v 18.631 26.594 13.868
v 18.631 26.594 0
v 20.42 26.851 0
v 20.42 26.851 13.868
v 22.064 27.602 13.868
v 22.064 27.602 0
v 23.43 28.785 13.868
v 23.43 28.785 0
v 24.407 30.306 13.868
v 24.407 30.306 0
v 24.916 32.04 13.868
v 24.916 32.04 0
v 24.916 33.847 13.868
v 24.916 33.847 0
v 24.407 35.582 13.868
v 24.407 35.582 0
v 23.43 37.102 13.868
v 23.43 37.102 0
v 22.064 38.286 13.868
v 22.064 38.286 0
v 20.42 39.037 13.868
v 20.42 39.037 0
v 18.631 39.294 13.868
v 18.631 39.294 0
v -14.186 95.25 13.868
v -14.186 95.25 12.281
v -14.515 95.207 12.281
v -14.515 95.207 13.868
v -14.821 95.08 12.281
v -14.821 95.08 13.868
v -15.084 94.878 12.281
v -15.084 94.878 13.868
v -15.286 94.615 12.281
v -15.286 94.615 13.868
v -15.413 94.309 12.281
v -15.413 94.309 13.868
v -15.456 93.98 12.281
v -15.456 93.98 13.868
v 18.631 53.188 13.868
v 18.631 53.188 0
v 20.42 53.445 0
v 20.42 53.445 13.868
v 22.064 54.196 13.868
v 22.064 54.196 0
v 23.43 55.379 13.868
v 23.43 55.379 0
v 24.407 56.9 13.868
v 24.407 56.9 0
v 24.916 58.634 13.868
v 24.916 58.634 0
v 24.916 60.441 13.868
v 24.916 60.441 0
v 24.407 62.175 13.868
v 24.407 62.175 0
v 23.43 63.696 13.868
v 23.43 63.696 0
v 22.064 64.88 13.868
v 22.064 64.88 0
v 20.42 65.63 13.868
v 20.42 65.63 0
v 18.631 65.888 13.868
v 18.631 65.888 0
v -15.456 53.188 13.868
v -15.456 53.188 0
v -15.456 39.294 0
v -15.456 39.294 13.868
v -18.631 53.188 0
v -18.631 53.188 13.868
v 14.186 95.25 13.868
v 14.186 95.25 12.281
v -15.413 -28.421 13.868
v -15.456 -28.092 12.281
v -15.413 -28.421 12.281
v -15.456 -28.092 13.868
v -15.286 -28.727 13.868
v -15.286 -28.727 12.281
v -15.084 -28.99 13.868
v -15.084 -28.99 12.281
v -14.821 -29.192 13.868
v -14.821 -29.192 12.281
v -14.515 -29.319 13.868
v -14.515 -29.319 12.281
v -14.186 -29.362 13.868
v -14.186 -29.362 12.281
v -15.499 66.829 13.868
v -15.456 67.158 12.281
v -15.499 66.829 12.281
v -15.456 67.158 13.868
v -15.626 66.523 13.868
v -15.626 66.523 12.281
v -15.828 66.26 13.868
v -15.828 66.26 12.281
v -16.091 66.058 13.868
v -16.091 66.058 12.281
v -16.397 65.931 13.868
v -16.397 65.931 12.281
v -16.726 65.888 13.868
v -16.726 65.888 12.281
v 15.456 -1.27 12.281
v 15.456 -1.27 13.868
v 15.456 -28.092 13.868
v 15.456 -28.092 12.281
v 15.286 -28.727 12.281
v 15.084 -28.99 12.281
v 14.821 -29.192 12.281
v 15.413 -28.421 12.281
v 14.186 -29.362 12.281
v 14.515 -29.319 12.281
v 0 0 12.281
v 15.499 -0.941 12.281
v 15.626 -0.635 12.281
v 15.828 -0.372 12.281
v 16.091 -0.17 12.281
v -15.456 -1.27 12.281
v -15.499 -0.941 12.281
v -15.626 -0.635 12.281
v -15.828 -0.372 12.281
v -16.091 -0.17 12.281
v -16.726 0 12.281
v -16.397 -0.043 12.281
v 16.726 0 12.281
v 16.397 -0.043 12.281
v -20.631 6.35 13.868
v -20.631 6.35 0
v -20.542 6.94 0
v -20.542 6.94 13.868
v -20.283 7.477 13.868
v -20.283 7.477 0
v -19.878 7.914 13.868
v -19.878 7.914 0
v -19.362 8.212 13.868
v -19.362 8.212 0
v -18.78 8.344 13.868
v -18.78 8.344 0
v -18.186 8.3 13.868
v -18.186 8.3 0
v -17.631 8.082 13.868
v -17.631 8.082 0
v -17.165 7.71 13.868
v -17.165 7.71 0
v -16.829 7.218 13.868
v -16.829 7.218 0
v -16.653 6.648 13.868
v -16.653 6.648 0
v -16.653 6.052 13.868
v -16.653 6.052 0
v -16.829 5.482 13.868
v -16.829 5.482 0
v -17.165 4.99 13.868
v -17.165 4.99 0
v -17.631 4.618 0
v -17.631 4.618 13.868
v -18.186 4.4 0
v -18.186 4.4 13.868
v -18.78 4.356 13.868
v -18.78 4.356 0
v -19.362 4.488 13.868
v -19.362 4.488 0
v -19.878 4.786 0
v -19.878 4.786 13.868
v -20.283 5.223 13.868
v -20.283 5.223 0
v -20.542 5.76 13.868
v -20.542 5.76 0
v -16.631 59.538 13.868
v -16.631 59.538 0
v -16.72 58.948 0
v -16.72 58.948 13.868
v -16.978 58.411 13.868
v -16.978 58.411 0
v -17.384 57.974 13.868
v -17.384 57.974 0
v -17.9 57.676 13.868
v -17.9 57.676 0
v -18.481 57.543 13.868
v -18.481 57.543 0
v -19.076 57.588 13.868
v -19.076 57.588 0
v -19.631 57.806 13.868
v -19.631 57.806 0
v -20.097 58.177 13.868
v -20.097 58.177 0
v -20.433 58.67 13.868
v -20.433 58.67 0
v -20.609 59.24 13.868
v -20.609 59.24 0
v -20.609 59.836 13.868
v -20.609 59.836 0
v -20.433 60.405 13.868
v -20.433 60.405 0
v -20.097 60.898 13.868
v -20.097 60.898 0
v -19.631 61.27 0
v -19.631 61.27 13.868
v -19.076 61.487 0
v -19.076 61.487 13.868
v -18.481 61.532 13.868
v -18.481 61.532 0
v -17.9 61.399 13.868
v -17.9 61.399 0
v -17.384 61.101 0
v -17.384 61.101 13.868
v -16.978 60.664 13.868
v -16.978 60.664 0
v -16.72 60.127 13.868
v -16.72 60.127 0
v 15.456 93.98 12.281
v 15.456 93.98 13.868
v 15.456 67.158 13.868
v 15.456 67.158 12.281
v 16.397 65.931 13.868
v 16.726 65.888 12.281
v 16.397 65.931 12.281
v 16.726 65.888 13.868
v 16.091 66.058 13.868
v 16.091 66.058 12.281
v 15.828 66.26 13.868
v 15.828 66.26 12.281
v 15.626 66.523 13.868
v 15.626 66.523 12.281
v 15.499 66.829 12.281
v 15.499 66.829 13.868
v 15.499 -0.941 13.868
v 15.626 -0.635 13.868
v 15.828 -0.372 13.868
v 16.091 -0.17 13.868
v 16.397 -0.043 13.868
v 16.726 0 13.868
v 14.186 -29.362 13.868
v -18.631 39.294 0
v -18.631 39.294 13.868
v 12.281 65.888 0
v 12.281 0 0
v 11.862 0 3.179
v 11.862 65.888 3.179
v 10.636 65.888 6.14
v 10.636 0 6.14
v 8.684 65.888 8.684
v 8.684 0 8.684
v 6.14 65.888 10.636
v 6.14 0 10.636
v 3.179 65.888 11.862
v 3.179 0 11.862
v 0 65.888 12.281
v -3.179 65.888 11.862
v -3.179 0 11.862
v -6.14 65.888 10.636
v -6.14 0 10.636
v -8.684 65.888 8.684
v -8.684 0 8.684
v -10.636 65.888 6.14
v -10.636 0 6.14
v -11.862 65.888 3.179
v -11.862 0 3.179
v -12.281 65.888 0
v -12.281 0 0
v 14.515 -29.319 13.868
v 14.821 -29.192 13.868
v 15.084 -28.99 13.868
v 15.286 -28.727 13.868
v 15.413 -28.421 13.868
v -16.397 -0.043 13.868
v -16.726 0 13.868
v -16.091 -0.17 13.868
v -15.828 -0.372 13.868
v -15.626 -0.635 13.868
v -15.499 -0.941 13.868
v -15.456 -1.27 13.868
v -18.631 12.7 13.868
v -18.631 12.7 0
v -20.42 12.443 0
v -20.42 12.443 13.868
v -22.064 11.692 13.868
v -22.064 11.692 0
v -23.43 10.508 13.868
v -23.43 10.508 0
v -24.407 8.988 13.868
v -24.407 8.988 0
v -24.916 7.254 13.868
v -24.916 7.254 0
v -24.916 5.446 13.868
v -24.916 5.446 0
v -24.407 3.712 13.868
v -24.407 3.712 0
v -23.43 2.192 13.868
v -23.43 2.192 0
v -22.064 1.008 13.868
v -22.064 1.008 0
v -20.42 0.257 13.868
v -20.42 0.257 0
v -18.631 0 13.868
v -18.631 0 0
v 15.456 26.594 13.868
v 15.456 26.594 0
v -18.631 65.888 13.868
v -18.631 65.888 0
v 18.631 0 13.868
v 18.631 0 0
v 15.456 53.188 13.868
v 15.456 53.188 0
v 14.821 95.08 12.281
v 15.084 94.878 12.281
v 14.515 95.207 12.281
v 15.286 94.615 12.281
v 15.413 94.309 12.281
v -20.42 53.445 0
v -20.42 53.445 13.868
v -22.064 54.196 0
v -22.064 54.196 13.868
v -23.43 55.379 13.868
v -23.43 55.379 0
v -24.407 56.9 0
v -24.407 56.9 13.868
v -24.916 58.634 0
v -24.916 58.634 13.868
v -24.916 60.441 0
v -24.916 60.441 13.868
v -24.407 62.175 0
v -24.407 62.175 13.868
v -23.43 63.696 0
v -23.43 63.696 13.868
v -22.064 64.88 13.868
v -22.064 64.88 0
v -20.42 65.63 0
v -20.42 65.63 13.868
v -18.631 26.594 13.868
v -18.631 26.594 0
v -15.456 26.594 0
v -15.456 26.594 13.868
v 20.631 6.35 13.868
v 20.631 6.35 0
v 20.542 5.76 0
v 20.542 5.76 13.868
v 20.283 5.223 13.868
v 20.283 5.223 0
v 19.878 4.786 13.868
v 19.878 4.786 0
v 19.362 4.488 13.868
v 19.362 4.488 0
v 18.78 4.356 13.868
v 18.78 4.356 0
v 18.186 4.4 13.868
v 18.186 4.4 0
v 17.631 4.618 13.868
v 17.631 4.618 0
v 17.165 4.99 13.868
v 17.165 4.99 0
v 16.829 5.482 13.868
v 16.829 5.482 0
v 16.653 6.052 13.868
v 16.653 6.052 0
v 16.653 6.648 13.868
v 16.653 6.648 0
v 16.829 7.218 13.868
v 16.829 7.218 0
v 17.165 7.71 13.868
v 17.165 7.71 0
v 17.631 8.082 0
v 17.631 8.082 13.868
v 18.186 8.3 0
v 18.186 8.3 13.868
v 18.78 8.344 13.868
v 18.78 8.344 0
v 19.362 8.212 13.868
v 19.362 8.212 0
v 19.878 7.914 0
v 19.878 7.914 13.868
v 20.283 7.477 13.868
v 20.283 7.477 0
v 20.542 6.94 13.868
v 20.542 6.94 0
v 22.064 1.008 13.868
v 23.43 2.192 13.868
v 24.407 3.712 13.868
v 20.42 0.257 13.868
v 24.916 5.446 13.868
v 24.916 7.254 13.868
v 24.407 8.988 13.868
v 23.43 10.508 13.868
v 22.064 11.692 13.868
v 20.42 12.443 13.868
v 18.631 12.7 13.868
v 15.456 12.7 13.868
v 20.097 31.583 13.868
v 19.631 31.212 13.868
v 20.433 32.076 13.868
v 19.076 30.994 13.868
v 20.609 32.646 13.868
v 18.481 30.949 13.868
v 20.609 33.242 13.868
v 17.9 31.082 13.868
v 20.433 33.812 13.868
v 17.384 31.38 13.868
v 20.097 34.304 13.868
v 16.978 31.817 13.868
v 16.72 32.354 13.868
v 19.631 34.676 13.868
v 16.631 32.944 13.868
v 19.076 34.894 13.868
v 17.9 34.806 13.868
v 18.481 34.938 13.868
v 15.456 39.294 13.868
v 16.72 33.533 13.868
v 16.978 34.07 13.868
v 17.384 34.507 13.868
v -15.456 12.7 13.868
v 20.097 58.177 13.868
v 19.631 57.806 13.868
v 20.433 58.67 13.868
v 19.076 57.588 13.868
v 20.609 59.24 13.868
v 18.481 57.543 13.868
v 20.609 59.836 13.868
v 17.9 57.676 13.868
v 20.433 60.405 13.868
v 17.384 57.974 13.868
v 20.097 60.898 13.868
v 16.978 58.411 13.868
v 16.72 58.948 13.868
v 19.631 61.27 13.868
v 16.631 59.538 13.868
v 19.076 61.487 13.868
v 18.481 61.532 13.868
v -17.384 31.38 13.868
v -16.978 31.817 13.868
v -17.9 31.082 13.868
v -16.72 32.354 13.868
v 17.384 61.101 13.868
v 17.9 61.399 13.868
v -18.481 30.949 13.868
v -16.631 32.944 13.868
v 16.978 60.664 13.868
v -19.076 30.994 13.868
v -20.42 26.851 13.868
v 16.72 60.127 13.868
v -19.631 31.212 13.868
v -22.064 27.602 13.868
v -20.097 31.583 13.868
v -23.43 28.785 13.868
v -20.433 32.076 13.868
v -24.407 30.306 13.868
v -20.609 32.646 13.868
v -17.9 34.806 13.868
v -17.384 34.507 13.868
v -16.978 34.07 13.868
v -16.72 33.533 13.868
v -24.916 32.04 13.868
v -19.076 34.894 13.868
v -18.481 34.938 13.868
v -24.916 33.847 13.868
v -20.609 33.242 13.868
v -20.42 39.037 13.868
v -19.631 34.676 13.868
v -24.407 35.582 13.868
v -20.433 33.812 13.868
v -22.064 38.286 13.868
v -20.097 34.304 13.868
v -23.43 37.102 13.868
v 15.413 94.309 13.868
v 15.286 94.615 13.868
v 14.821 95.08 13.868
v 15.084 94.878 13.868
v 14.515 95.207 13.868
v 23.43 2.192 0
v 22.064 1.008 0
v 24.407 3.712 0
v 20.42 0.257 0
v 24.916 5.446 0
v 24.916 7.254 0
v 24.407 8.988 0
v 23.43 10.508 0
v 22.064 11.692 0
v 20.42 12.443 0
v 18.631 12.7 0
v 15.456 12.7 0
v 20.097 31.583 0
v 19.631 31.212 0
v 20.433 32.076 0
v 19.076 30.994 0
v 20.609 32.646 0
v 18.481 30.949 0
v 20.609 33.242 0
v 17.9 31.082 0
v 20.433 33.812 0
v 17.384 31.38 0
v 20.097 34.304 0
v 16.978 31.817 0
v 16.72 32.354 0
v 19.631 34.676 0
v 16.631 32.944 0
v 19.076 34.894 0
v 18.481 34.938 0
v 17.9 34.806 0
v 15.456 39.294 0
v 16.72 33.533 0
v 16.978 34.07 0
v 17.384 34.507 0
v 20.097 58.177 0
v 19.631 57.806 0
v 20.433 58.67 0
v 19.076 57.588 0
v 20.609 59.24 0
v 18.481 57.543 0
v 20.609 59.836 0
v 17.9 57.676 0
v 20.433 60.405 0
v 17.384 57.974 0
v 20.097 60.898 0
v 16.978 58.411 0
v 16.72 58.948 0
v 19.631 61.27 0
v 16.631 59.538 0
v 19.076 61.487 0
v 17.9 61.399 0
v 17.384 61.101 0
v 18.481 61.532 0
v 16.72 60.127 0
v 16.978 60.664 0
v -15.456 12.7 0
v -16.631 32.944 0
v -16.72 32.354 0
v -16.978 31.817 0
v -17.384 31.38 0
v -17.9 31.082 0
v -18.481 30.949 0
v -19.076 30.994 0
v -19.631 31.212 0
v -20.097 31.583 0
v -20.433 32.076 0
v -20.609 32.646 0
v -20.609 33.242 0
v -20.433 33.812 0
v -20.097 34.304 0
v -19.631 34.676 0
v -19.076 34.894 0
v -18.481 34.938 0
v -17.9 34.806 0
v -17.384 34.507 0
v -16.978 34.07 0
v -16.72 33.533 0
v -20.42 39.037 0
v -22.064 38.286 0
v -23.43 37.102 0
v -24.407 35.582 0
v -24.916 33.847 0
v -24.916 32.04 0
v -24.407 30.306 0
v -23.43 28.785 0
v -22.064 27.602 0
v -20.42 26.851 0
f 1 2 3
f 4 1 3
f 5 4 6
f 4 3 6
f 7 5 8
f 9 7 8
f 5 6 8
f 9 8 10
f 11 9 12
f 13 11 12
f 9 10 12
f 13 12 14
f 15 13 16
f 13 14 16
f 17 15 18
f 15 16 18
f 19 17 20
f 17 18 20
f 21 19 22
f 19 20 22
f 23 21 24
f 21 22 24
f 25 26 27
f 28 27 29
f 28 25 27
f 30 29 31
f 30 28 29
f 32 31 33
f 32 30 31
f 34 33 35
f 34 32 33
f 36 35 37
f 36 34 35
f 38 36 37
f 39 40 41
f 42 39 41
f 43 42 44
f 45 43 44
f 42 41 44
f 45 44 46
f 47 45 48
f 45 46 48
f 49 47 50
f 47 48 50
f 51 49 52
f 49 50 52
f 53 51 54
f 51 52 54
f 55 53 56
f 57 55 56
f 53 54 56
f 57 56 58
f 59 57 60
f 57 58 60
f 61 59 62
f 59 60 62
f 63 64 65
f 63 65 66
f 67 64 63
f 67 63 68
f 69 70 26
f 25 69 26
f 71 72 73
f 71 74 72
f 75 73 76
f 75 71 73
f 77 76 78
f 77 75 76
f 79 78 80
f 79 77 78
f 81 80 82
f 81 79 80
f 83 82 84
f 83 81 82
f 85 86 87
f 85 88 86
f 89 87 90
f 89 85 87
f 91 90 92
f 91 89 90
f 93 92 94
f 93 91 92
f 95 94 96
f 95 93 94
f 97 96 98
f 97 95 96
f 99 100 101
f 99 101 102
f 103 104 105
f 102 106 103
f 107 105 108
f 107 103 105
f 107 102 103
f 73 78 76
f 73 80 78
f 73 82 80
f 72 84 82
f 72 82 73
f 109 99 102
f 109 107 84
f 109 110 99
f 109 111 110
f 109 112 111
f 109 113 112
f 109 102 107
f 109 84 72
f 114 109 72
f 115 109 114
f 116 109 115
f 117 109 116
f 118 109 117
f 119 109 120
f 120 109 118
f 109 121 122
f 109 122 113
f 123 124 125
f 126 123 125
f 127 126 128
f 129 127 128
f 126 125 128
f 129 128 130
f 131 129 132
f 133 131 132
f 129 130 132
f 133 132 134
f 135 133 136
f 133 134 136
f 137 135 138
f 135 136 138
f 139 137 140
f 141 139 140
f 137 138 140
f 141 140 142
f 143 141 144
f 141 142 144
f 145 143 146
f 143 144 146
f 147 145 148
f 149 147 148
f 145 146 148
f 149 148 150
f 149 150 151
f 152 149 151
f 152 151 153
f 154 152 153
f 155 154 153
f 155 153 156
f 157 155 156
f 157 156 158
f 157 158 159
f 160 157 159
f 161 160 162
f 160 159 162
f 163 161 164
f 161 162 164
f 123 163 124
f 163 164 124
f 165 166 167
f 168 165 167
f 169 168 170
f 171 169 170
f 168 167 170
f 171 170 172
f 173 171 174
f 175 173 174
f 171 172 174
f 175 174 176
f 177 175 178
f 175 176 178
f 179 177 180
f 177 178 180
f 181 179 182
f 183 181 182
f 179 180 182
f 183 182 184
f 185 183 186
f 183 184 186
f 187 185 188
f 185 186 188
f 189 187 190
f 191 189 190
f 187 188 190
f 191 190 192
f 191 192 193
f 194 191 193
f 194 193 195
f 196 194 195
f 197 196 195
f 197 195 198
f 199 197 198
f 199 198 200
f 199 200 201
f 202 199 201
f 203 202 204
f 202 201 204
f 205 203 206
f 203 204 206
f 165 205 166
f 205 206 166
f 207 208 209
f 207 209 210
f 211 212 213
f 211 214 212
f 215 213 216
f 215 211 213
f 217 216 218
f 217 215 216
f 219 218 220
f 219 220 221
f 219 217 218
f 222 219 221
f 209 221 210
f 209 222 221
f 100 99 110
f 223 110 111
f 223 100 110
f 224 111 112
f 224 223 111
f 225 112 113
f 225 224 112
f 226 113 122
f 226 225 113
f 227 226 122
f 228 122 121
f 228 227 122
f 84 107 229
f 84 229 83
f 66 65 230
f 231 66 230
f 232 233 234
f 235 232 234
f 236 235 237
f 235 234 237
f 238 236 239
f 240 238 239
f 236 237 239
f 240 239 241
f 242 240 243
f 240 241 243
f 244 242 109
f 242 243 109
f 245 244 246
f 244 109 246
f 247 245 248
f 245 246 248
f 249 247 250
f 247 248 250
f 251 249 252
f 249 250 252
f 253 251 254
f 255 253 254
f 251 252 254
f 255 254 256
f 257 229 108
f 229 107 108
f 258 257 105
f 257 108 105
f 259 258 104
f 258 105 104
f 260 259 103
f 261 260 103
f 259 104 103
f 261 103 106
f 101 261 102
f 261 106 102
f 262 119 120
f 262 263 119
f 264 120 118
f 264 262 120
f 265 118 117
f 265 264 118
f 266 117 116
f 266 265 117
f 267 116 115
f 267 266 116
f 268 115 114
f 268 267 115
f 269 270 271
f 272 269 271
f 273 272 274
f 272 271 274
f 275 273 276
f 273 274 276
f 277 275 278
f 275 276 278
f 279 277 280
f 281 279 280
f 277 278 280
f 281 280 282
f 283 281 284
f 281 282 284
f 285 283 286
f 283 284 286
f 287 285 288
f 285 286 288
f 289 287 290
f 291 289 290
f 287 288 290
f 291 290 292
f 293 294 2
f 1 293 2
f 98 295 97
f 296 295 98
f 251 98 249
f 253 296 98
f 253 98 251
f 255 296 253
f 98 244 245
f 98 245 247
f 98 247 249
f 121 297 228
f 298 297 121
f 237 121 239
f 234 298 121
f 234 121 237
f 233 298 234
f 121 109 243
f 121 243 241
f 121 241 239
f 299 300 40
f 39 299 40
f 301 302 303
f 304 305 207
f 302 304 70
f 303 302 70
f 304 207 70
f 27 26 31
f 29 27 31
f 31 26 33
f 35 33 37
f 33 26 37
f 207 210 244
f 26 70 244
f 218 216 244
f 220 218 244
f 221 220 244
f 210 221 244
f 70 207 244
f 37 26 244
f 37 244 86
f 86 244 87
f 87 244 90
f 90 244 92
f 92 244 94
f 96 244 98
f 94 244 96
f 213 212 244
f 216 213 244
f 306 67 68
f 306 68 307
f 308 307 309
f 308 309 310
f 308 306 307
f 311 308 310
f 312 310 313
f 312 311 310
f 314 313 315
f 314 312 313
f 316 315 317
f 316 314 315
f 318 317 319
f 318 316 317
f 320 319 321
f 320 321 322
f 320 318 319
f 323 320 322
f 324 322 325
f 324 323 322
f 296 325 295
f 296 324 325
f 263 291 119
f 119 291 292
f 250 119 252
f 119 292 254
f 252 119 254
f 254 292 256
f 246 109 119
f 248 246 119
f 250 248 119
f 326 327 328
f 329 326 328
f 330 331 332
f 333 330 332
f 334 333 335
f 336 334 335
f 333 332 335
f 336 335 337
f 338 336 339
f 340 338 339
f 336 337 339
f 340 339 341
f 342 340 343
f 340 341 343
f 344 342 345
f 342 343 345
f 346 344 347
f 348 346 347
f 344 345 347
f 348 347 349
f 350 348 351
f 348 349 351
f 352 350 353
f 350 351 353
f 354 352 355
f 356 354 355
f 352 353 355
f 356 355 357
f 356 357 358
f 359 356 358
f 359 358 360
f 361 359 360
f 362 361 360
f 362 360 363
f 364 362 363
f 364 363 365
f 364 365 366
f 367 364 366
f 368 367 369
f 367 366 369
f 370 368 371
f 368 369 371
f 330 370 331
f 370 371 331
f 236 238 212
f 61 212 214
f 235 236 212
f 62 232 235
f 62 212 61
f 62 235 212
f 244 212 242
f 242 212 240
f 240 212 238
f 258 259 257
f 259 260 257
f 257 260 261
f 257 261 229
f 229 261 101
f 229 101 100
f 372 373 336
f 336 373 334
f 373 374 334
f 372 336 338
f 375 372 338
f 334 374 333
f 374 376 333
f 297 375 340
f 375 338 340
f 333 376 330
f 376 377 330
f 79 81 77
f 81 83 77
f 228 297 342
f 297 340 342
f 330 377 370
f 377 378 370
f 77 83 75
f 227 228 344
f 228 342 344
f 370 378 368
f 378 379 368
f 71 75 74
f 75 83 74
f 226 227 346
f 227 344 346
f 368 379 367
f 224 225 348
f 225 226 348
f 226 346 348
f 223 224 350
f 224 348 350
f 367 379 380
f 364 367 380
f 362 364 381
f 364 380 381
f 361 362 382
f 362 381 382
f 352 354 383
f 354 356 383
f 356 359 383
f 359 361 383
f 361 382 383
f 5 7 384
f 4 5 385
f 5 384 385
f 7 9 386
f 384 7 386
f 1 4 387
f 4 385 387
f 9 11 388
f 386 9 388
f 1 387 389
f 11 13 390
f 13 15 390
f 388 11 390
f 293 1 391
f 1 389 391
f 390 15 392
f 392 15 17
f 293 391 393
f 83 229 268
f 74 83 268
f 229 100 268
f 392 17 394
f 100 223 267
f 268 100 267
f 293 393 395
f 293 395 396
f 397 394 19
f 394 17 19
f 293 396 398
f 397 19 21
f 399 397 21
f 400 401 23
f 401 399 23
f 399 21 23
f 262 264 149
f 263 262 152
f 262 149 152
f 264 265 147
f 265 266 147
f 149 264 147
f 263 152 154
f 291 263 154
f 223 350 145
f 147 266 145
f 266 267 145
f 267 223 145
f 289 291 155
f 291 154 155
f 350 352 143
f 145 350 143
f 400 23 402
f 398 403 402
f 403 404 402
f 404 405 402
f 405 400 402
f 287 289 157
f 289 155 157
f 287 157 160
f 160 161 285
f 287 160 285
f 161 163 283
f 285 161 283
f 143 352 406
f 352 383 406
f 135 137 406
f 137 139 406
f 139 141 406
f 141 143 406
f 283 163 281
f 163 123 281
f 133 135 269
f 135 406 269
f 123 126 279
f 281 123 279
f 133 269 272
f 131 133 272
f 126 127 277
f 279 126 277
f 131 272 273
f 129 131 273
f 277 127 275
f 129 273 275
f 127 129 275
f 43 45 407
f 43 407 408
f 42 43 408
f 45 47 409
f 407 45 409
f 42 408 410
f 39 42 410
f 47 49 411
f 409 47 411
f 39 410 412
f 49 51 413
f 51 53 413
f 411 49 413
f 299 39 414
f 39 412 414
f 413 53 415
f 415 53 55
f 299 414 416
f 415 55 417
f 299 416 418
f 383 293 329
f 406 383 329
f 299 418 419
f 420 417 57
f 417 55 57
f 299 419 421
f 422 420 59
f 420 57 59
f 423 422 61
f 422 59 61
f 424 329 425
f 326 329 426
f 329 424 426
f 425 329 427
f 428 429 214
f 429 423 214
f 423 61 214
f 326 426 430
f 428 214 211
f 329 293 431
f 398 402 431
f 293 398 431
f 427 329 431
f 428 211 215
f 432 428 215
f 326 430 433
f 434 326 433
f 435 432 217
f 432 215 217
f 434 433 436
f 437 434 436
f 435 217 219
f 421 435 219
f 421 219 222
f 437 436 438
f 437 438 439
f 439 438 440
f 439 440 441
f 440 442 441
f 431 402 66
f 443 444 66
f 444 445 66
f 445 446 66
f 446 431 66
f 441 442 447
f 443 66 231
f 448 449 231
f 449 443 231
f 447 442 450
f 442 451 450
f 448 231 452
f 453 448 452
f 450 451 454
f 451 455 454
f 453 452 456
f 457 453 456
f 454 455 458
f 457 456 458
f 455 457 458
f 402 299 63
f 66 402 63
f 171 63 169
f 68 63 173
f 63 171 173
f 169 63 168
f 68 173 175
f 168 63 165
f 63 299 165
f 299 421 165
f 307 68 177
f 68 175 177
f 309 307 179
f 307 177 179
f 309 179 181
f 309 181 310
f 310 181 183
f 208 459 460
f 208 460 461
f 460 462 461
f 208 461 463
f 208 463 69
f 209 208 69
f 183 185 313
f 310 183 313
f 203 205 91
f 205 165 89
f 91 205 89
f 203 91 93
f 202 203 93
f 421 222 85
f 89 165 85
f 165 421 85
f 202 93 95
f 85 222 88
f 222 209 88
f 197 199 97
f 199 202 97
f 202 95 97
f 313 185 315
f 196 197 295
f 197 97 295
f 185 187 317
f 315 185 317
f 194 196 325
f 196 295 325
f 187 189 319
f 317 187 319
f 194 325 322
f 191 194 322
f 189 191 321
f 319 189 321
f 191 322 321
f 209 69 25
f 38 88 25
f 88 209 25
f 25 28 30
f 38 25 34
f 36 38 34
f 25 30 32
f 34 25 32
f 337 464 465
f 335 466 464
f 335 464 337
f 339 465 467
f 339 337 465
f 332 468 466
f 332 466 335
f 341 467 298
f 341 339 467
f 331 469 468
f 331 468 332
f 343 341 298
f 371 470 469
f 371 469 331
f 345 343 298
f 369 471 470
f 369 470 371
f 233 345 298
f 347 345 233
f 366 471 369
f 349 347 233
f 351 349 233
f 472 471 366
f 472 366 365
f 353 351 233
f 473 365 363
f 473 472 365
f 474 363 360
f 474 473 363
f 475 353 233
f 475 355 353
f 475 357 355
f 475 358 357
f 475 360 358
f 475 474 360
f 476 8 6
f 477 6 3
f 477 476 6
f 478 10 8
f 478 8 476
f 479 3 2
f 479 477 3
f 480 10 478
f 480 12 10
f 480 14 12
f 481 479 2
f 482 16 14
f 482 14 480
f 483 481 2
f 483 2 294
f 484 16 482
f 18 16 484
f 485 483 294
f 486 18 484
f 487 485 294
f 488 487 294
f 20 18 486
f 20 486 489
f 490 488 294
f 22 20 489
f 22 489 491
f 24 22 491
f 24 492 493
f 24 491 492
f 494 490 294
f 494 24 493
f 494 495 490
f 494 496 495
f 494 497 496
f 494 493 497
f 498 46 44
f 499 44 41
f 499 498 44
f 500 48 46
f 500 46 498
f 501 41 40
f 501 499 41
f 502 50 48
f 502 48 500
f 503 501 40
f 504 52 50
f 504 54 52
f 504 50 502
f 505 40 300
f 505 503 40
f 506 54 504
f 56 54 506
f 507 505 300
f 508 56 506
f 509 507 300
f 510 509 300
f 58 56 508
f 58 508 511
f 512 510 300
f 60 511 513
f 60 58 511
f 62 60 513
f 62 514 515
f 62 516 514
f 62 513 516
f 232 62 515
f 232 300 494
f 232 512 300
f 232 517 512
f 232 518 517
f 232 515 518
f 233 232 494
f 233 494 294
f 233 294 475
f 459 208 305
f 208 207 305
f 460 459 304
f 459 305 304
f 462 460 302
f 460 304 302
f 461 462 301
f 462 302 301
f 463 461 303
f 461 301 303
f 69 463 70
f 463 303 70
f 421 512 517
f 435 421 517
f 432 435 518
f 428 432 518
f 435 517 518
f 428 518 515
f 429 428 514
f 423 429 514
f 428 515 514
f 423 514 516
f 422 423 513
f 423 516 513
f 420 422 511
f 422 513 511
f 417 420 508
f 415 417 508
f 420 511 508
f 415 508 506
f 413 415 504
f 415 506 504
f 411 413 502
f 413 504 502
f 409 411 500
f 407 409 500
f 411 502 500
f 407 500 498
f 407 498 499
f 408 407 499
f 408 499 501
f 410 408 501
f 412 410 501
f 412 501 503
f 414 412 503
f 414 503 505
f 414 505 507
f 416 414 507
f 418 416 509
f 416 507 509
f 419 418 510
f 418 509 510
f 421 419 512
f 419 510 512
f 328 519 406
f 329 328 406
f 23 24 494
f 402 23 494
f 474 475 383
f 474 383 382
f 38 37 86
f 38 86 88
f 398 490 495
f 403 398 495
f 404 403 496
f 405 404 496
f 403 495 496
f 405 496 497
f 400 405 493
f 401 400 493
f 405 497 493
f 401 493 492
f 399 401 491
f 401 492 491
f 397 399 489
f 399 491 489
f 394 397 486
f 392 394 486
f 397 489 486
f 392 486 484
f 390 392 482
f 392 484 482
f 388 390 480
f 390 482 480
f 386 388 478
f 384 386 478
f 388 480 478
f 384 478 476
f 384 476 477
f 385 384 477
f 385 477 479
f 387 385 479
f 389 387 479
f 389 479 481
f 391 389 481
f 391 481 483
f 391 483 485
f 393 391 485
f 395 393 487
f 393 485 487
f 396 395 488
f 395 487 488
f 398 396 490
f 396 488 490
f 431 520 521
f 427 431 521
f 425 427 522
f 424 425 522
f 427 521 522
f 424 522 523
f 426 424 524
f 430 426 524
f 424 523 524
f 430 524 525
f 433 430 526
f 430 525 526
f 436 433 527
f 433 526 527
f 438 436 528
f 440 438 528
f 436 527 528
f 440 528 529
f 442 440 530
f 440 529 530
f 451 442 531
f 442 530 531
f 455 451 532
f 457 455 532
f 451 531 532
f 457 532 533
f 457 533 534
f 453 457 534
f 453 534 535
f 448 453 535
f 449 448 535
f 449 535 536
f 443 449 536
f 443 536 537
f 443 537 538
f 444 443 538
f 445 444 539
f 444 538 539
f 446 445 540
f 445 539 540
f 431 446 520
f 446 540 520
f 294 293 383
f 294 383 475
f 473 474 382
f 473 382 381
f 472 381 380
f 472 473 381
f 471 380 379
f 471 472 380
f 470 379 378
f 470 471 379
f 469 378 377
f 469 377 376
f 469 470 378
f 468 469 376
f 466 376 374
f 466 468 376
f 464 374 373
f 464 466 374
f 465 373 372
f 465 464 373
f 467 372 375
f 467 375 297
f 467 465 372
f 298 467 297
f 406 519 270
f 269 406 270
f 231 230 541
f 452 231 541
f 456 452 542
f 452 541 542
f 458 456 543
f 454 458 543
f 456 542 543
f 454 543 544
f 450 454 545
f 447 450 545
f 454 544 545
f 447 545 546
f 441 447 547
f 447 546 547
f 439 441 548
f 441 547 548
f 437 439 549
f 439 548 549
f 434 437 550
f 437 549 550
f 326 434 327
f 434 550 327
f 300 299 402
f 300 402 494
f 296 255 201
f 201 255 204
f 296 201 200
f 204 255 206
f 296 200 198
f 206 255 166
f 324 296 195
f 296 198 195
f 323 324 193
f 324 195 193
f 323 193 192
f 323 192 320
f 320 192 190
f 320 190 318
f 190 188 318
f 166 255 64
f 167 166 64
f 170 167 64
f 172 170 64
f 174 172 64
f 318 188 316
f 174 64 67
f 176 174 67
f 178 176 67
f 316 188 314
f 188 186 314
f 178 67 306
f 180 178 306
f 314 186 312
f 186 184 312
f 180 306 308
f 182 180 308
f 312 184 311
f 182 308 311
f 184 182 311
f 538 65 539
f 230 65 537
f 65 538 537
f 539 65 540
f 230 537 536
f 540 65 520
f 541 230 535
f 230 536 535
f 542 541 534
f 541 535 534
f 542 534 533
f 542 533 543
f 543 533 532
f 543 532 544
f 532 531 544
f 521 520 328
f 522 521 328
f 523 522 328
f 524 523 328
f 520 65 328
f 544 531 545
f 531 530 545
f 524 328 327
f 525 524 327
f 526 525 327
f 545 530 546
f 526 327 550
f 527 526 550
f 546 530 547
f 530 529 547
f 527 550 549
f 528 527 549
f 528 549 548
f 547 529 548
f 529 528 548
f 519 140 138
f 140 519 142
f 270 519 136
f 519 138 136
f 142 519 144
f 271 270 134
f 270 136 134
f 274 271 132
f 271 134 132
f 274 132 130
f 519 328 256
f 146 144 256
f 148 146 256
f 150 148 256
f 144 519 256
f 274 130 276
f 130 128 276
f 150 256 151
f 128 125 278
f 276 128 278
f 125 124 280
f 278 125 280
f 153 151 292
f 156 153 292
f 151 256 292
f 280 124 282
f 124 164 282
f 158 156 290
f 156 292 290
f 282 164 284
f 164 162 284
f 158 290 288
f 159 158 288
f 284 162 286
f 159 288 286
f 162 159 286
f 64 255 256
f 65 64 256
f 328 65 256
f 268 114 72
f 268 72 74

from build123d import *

# Parameters (mm, degrees)
BOSS_EXTRUDE1_DEPTH = 65.8876
BOSS_EXTRUDE2_DEPTH = 29.3624
SKETCH4_R           = 2
BOSS_EXTRUDE3_DEPTH = 13.8684
FILLET1_R           = 1.27


with BuildPart() as part:
    # Sketch1 → Boss-Extrude1 (new body)
    with BuildSketch(Plane(origin=(0, 0, 0), x_dir=(1, 0, 0), z_dir=(0, 1, 0))):
        with BuildLine():
            Line((-12.2809, 0), (-15.4559, 0))
            Line((-15.4559, 0), (-15.4559, -13.3604))
            Line((-15.4559, -13.3604), (-15.4559, -13.8684))
            Line((-15.4559, -13.8684), (0, -13.8684))
            Line((0, -13.8684), (15.4559, -13.8684))
            Line((15.4559, -13.8684), (15.4559, -13.3604))
            Line((15.4559, -13.3604), (15.4559, 0))
            Line((15.4559, 0), (12.2809, 0))
            ThreePointArc((12.2809, 0), (0, -12.2809), (-12.2809, 0))
        make_face()
    extrude(amount=BOSS_EXTRUDE1_DEPTH)

    # Sketch2 → Boss-Extrude2 (add)
    with BuildSketch(Plane(origin=(0, 65.8876, 0), x_dir=(1, 0, 0), z_dir=(0, 1, 0))):
        Polygon((-12.2809, -12.2809), (0, -12.2809), (12.2809, -12.2809), (15.4559, -12.2809), (15.4559, -13.3604), (15.4559, -13.8684), (-15.4559, -13.8684), (-15.4559, -13.3604), (-15.4559, -12.2809), align=None)
    boss_extrude2 = extrude(amount=BOSS_EXTRUDE2_DEPTH)

    # Mirror1: Boss-Extrude2 across plane
    add(boss_extrude2.mirror(Plane.ZX.offset(32.9438)))

    # Sketch4 → Boss-Extrude3 (add, through all)
    # profile 1 of 6: a face of its own
    with BuildSketch(Plane(origin=(0, 0, 0), x_dir=(-1, 0, 0), z_dir=(0, 0, -1))):
        with BuildLine():
            Line((-15.4559, 39.2938), (-15.4559, 26.5938))
            Line((-15.4559, 26.5938), (-18.6309, 26.5938))
            ThreePointArc((-18.6309, 26.5938), (-24.9809, 32.9438), (-18.6309, 39.2938))
            Line((-18.6309, 39.2938), (-15.4559, 39.2938))
        make_face()
        with Locations((-18.6309, 32.9438)):
            Circle(SKETCH4_R, mode=Mode.SUBTRACT)
    # profile 2 of 6: a face of its own
    with BuildSketch(Plane(origin=(0, 0, 0), x_dir=(-1, 0, 0), z_dir=(0, 0, -1))):
        with BuildLine():
            Line((-15.4559, 12.7), (-18.6309, 12.7))
            ThreePointArc((-18.6309, 12.7), (-24.9809, 6.35), (-18.6309, 0))
            Line((-18.6309, 0), (-15.4559, 0))
            Line((-15.4559, 0), (-15.4559, 12.7))
        make_face()
        with Locations(Location((-18.6309, 6.35, 0), (0, 0, 180))):
            Circle(SKETCH4_R, mode=Mode.SUBTRACT)
    # profile 3 of 6: a face of its own
    with BuildSketch(Plane(origin=(0, 0, 0), x_dir=(-1, 0, 0), z_dir=(0, 0, -1))):
        with BuildLine():
            Line((-18.6309, 65.8876), (-15.4559, 65.8876))
            Line((-15.4559, 65.8876), (-15.4559, 53.1876))
            Line((-15.4559, 53.1876), (-18.6309, 53.1876))
            ThreePointArc((-18.6309, 53.1876), (-24.9809, 59.5376), (-18.6309, 65.8876))
        make_face()
        with Locations((-18.6309, 59.5376)):
            Circle(SKETCH4_R, mode=Mode.SUBTRACT)
    # profile 4 of 6: a face of its own
    with BuildSketch(Plane(origin=(0, 0, 0), x_dir=(-1, 0, 0), z_dir=(0, 0, -1))):
        with BuildLine():
            Line((18.6309, 0), (15.4559, 0))
            Line((15.4559, 0), (15.4559, 12.7))
            Line((15.4559, 12.7), (18.6309, 12.7))
            ThreePointArc((18.6309, 12.7), (24.9809, 6.35), (18.6309, 0))
        make_face()
        with Locations((18.6309, 6.35)):
            Circle(SKETCH4_R, mode=Mode.SUBTRACT)
    # profile 5 of 6: a face of its own
    with BuildSketch(Plane(origin=(0, 0, 0), x_dir=(-1, 0, 0), z_dir=(0, 0, -1))):
        with BuildLine():
            Line((15.4559, 53.1876), (18.6309, 53.1876))
            ThreePointArc((18.6309, 53.1876), (24.9809, 59.5376), (18.6309, 65.8876))
            Line((18.6309, 65.8876), (15.4559, 65.8876))
            Line((15.4559, 65.8876), (15.4559, 53.1876))
        make_face()
        with Locations(Location((18.6309, 59.5376, 0), (0, 0, 180))):
            Circle(SKETCH4_R, mode=Mode.SUBTRACT)
    # profile 6 of 6: a face of its own
    with BuildSketch(Plane(origin=(0, 0, 0), x_dir=(-1, 0, 0), z_dir=(0, 0, -1))):
        with BuildLine():
            Line((18.6309, 26.5938), (15.4559, 26.5938))
            Line((15.4559, 26.5938), (15.4559, 39.2938))
            Line((15.4559, 39.2938), (18.6309, 39.2938))
            ThreePointArc((18.6309, 39.2938), (24.9809, 32.9438), (18.6309, 26.5938))
        make_face()
        with Locations(Location((18.6309, 32.9438, 0), (0, 0, 180))):
            Circle(SKETCH4_R, mode=Mode.SUBTRACT)
    extrude(amount=-BOSS_EXTRUDE3_DEPTH)

    # Fillet1
    fillet1_edges = [part.edges().sort_by_distance(p)[0] for p in [
        (-15.4559, 65.8876, 13.07465),
        (-15.4559, 0, 13.07465),
        (15.4559, 95.25, 13.07465),
        (-15.4559, 95.25, 13.07465),
        (-15.4559, -29.3624, 13.07465),
        (15.4559, -29.3624, 13.07465),
        (15.4559, 65.8876, 13.07465),
        (15.4559, 0, 13.07465),
    ]]
    fillet(fillet1_edges, radius=FILLET1_R)


solid = part.part
